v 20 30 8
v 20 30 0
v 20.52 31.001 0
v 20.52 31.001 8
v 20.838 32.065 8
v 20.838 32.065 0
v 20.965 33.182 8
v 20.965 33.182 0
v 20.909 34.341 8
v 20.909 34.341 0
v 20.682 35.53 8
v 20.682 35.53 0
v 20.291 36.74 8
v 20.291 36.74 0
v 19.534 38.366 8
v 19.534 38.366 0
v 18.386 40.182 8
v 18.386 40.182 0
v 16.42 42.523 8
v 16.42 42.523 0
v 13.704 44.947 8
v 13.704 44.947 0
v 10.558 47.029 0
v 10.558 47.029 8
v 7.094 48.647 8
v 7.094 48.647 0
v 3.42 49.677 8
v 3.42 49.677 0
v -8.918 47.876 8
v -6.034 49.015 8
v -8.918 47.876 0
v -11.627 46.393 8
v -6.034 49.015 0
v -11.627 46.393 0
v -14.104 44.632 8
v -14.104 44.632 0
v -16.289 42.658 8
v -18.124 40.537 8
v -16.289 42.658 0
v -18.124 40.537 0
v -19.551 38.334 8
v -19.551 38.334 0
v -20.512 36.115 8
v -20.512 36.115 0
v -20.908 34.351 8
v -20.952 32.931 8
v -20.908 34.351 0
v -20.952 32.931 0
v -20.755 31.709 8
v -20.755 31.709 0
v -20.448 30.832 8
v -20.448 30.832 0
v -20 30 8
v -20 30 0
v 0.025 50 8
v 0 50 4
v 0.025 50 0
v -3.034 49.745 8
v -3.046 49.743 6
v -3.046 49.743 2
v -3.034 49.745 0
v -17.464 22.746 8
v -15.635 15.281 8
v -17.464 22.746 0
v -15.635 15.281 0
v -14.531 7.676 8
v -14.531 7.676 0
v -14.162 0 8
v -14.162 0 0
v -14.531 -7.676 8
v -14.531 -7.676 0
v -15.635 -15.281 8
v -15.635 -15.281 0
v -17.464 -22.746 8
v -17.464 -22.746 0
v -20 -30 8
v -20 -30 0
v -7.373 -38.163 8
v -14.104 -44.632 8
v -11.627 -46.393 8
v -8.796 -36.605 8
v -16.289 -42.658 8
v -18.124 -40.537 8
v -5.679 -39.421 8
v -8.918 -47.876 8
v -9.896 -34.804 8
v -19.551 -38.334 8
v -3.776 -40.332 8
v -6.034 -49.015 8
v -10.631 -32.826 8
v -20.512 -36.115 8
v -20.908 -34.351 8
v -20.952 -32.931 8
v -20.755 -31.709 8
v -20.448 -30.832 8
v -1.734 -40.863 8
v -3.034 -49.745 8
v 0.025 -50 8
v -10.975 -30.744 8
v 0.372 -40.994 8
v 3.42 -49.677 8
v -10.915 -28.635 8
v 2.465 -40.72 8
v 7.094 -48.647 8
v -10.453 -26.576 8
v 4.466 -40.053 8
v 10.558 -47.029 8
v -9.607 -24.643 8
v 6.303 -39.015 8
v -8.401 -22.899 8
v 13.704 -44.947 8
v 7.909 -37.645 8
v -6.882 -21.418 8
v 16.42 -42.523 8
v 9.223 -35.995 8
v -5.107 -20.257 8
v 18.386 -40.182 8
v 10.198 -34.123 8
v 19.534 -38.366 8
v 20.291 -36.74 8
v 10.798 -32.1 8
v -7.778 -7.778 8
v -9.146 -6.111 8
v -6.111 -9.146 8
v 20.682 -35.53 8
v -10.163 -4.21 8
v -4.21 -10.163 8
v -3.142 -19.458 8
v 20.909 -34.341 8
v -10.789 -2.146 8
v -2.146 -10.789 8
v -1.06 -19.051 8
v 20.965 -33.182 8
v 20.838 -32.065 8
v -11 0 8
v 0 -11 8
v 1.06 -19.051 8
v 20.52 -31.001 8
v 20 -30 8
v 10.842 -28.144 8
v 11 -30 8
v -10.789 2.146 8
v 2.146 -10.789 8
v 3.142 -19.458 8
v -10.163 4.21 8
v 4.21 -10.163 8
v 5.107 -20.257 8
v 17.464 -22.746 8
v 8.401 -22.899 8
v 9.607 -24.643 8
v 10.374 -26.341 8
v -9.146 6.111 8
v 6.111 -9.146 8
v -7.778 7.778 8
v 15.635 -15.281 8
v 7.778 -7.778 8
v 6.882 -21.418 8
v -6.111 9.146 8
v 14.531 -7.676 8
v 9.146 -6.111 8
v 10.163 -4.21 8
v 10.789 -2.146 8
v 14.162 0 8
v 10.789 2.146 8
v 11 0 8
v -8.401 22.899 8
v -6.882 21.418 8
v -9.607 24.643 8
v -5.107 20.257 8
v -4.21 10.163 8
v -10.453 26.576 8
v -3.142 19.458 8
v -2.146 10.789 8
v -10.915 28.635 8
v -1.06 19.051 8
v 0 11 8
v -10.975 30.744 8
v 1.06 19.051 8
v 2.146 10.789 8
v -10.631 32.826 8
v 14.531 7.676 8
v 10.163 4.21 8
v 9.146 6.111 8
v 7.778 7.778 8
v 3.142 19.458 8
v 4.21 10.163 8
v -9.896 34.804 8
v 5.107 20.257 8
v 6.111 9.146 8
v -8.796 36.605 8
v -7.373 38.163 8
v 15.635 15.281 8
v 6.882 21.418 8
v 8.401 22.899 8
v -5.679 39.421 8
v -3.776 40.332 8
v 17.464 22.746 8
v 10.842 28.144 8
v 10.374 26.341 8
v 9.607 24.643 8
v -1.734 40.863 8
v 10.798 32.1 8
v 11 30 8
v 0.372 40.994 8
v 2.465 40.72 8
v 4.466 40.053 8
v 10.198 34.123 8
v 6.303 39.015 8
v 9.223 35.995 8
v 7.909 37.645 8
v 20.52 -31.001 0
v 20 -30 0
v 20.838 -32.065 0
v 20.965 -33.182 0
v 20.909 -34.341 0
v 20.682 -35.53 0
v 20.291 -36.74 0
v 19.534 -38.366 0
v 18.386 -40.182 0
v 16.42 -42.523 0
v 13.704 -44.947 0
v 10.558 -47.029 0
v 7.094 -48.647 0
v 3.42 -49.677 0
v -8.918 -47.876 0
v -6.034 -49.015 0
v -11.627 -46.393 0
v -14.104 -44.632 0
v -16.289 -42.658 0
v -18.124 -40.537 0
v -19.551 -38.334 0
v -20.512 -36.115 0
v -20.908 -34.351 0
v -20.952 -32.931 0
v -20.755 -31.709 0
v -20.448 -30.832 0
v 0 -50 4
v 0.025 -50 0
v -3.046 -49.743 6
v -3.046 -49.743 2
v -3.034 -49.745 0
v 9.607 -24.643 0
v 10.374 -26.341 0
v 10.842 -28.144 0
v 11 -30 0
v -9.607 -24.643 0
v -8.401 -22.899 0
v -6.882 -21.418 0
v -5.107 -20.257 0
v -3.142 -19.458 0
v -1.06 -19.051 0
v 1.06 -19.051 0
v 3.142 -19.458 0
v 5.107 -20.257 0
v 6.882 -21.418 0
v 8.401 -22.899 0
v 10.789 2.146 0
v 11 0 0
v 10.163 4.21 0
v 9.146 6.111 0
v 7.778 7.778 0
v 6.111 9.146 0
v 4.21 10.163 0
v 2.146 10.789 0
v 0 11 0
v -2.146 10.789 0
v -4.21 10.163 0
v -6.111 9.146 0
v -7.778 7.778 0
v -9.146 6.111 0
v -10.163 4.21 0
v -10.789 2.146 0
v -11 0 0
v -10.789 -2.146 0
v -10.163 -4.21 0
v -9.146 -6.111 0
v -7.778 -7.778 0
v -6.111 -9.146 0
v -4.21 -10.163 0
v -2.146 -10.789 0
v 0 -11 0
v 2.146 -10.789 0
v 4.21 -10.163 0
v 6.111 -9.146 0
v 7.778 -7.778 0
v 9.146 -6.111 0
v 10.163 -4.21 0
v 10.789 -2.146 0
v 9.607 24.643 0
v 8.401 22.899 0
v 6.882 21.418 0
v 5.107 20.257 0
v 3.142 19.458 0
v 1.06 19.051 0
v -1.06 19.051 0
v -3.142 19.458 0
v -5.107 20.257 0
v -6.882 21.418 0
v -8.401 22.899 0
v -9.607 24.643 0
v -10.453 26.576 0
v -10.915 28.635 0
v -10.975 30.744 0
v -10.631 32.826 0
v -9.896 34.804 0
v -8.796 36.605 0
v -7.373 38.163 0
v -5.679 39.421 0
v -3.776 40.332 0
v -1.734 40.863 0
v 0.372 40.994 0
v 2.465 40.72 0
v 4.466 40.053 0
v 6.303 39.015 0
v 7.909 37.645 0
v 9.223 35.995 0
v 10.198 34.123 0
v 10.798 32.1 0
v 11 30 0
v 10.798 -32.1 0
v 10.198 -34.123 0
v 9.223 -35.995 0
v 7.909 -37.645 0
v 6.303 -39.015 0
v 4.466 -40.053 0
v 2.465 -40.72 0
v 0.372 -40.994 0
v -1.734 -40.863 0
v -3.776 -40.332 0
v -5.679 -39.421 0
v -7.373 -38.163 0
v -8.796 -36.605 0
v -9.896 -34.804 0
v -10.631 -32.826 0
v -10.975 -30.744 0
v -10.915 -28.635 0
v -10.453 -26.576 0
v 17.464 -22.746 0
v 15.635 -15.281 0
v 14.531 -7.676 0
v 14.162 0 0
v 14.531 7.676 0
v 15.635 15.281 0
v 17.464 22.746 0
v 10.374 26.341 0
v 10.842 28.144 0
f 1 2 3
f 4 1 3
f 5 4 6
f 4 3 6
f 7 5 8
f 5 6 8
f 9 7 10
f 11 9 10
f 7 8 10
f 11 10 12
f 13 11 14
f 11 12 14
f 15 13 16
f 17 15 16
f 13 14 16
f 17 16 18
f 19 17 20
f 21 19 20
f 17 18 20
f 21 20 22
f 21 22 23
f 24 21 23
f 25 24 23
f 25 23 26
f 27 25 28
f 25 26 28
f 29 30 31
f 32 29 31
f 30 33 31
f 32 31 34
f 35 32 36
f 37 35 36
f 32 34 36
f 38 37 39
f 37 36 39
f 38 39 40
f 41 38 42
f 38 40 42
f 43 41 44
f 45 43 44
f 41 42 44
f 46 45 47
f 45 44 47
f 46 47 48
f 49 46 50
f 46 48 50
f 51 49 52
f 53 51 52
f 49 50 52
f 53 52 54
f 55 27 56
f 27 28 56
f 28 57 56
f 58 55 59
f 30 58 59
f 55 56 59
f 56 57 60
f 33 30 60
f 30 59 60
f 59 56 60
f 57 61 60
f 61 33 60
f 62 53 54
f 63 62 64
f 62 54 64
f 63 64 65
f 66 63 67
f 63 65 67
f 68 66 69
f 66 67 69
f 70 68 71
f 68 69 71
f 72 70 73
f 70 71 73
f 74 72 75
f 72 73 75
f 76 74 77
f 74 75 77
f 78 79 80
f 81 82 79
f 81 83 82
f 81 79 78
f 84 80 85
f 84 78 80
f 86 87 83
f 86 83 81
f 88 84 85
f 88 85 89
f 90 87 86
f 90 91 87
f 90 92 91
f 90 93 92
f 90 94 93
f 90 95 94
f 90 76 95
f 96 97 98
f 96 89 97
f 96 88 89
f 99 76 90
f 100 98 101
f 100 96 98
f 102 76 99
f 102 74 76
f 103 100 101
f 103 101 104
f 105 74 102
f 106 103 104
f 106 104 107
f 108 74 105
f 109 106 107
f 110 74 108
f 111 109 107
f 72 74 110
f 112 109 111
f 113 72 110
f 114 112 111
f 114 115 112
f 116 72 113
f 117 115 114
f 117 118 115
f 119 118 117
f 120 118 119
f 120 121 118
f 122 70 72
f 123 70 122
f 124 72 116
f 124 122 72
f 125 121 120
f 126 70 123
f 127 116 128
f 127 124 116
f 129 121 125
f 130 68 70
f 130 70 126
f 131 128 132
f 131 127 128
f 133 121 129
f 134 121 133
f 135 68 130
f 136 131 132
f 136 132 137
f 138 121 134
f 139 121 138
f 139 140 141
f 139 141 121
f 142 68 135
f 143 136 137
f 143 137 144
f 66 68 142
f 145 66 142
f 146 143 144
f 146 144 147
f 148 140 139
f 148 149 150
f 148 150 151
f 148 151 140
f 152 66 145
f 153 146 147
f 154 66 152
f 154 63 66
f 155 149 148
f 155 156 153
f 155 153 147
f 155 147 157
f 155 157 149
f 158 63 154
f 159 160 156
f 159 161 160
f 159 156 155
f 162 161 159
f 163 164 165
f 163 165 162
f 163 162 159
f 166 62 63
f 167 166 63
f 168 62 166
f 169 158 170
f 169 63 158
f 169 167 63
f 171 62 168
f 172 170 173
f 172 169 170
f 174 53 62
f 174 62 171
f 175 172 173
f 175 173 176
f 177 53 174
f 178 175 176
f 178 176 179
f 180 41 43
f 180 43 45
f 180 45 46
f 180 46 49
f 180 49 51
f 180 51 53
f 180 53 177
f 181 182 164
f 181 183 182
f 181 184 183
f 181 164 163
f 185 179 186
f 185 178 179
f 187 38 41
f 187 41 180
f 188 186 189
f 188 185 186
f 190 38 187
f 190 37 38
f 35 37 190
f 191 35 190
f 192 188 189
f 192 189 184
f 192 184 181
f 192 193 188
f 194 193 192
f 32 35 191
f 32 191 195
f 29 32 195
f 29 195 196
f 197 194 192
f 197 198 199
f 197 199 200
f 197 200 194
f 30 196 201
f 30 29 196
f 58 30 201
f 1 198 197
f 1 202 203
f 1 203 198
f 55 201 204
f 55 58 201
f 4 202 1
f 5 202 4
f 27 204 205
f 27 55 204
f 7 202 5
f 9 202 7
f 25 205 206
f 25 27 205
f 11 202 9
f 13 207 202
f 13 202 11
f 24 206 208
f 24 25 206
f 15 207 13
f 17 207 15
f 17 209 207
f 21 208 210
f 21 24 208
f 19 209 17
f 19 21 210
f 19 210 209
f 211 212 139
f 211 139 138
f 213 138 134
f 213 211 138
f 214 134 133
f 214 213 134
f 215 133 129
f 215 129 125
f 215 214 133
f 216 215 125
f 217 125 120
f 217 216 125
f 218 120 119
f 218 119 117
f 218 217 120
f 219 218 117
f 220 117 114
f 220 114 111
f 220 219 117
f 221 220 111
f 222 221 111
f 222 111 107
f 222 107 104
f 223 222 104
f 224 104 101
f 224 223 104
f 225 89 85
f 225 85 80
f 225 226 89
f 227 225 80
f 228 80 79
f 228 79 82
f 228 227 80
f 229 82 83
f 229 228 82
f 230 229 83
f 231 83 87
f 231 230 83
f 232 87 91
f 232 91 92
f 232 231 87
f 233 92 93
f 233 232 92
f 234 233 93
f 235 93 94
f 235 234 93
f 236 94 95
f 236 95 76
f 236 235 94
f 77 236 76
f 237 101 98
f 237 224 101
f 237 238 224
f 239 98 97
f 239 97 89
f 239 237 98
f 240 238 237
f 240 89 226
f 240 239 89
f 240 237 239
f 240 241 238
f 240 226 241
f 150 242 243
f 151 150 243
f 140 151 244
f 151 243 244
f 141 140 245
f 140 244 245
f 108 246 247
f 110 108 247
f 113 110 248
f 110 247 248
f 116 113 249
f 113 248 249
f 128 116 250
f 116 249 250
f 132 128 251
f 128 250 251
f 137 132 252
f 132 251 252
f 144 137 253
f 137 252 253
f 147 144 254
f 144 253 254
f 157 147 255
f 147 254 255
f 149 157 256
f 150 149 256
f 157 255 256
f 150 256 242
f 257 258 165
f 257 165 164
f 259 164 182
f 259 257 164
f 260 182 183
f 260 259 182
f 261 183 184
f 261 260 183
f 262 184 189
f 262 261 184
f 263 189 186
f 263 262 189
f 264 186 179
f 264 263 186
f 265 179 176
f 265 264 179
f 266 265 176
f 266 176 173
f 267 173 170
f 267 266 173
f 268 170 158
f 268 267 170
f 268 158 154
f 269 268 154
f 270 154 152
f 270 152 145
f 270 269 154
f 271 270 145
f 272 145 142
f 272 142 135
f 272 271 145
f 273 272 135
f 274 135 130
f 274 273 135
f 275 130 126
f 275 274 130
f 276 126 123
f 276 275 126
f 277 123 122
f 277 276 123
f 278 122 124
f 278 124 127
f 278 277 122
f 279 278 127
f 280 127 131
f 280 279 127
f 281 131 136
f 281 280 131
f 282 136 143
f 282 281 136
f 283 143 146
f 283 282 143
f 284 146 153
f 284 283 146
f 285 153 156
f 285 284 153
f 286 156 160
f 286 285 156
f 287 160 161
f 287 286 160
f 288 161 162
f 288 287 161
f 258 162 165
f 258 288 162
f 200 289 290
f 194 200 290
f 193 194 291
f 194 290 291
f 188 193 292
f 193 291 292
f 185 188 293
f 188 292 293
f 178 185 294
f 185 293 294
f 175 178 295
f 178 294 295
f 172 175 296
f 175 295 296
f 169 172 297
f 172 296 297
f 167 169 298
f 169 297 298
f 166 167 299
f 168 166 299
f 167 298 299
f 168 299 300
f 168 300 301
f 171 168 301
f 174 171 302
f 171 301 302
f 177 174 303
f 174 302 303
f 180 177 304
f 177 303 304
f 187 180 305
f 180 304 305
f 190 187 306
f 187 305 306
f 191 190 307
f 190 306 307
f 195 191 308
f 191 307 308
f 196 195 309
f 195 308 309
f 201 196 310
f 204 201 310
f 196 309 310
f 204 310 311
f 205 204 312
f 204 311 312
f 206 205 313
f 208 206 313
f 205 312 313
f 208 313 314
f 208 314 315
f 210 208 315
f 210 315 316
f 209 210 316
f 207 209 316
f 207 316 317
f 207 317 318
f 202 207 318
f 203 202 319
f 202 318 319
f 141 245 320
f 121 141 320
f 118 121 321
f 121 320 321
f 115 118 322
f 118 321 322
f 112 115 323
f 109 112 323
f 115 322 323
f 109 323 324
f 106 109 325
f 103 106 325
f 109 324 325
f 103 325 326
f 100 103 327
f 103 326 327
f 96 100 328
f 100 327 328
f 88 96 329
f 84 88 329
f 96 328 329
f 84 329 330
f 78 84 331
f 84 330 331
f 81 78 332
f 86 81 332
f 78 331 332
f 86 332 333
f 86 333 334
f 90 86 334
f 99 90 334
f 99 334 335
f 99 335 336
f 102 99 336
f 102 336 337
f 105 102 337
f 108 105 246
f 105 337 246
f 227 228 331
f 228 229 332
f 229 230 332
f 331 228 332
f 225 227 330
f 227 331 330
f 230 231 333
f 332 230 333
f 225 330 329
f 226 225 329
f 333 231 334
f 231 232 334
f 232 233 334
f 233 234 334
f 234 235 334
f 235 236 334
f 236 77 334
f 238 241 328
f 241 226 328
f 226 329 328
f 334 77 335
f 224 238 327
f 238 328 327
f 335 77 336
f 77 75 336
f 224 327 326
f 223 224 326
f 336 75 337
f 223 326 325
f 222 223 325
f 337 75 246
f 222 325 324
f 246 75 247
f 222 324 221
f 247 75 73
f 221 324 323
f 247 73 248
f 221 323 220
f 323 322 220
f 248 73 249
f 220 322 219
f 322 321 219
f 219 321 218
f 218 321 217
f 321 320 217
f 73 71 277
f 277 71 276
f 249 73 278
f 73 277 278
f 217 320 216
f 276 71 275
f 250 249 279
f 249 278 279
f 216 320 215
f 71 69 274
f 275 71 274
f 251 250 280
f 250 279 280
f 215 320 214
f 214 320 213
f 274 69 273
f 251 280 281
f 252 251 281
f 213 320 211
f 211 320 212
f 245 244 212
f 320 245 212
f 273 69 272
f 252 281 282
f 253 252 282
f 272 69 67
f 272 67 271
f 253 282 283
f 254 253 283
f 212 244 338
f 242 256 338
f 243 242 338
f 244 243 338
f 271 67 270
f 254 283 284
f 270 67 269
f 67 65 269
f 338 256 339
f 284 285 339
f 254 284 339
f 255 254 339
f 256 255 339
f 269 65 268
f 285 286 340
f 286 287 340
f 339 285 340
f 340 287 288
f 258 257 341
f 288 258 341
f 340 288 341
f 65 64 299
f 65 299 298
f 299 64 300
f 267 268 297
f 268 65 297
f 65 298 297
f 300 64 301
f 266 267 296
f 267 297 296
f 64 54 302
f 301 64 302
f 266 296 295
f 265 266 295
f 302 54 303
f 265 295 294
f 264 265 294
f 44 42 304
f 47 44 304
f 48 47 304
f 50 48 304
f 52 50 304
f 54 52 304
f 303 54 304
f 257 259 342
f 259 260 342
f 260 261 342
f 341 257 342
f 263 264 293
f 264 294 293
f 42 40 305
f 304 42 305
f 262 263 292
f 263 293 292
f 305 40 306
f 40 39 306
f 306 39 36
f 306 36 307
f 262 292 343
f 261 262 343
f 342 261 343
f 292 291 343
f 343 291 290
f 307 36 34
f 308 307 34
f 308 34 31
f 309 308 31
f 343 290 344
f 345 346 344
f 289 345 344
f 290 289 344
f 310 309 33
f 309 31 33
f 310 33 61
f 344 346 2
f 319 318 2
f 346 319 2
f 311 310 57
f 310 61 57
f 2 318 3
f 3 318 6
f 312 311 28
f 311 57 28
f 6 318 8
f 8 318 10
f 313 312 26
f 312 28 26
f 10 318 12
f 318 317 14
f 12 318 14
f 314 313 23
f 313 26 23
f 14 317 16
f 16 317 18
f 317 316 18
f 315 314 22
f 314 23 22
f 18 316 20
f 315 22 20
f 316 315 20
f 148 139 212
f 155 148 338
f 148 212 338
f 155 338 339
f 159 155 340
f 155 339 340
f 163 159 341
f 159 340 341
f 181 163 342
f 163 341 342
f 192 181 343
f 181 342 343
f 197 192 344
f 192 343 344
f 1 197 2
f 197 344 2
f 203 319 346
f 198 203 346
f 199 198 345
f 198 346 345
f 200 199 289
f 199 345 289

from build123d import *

# Parameters (mm, degrees)
F0_R     = 11
F1_DEPTH = 8


with BuildPart() as f1:
    # F0 (on Top) → F1 (new body)
    with BuildSketch(Plane.XY):
        with BuildLine():
            ThreePointArc((-9.6073463611, 24.6428649543), (-2.7675973359, 40.6461450763), (11, 30))
            ThreePointArc((11, 30), (10.6461450763, 27.2324026641), (9.6073463611, 24.6428649543))
            add(Edge.make_bspline(
                [(9.6073463611, 24.6428649543), (14.4035735746, 25.6322402973), (18.3329413126, 27.4179519792), (20, 30)],
                knots=[0.8849975762, 0.8849975762, 0.8849975762, 0.8849975762, 1, 1, 1, 1], degree=3))
            add(Edge.make_bspline(
                [(20, 30), (24.5452855367, 37.0400314114), (0, 62.9599685886), (-24.5452855367, 37.0400314114), (-20, 30)],
                knots=[0, 0, 0, 0, 0.3135575596, 0.6271151192, 0.6271151192, 0.6271151192, 0.6271151192], degree=3))
            add(Edge.make_bspline(
                [(-20, 30), (-18.3329413126, 27.4179519792), (-14.4035735746, 25.6322402973), (-9.6073463611, 24.6428649543)],
                knots=[0.6271151192, 0.6271151192, 0.6271151192, 0.6271151192, 0.742117543, 0.742117543, 0.742117543, 0.742117543], degree=3))
        make_face()
        with BuildLine():
            ThreePointArc((9.6073463611, 24.6428649543), (0, 19), (-9.6073463611, 24.6428649543))
            add(Edge.make_bspline(
                [(-20, 30), (-18.3329413126, 27.4179519792), (-14.4035735746, 25.6322402973), (-9.6073463611, 24.6428649543)],
                knots=[0.6271151192, 0.6271151192, 0.6271151192, 0.6271151192, 0.742117543, 0.742117543, 0.742117543, 0.742117543], degree=3))
            ThreePointArc((-20, 30), (-14.161984871, 0), (-20, -30))
            add(Edge.make_bspline(
                [(-20, -30), (-18.3329413126, -27.4179519792), (-14.4035735746, -25.6322402973), (-9.6073463611, -24.6428649543)],
                knots=[0.6271151192, 0.6271151192, 0.6271151192, 0.6271151192, 0.742117543, 0.742117543, 0.742117543, 0.742117543], degree=3))
            ThreePointArc((-9.6073463611, -24.6428649543), (0, -19), (9.6073463611, -24.6428649543))
            add(Edge.make_bspline(
                [(9.6073463611, -24.6428649543), (14.4035735746, -25.6322402973), (18.3329413126, -27.4179519792), (20, -30)],
                knots=[0.8849975762, 0.8849975762, 0.8849975762, 0.8849975762, 1, 1, 1, 1], degree=3))
            ThreePointArc((20, -30), (14.161984871, 0), (20, 30))
            add(Edge.make_bspline(
                [(9.6073463611, 24.6428649543), (14.4035735746, 25.6322402973), (18.3329413126, 27.4179519792), (20, 30)],
                knots=[0.8849975762, 0.8849975762, 0.8849975762, 0.8849975762, 1, 1, 1, 1], degree=3))
        make_face()
        Circle(F0_R, mode=Mode.SUBTRACT)
        with BuildLine():
            add(Edge.make_bspline(
                [(-20, -30), (-18.3329413126, -27.4179519792), (-14.4035735746, -25.6322402973), (-9.6073463611, -24.6428649543)],
                knots=[0.6271151192, 0.6271151192, 0.6271151192, 0.6271151192, 0.742117543, 0.742117543, 0.742117543, 0.742117543], degree=3))
            add(Edge.make_bspline(
                [(20, -30), (24.5452855367, -37.0400314114), (0, -62.9599685886), (-24.5452855367, -37.0400314114), (-20, -30)],
                knots=[0, 0, 0, 0, 0.3135575596, 0.6271151192, 0.6271151192, 0.6271151192, 0.6271151192], degree=3))
            add(Edge.make_bspline(
                [(9.6073463611, -24.6428649543), (14.4035735746, -25.6322402973), (18.3329413126, -27.4179519792), (20, -30)],
                knots=[0.8849975762, 0.8849975762, 0.8849975762, 0.8849975762, 1, 1, 1, 1], degree=3))
            ThreePointArc((9.6073463611, -24.6428649543), (10.6461450763, -27.2324026641), (11, -30))
            ThreePointArc((11, -30), (-2.7675973359, -40.6461450763), (-9.6073463611, -24.6428649543))
        make_face()
    extrude(amount=F1_DEPTH)


solid = f1.part
